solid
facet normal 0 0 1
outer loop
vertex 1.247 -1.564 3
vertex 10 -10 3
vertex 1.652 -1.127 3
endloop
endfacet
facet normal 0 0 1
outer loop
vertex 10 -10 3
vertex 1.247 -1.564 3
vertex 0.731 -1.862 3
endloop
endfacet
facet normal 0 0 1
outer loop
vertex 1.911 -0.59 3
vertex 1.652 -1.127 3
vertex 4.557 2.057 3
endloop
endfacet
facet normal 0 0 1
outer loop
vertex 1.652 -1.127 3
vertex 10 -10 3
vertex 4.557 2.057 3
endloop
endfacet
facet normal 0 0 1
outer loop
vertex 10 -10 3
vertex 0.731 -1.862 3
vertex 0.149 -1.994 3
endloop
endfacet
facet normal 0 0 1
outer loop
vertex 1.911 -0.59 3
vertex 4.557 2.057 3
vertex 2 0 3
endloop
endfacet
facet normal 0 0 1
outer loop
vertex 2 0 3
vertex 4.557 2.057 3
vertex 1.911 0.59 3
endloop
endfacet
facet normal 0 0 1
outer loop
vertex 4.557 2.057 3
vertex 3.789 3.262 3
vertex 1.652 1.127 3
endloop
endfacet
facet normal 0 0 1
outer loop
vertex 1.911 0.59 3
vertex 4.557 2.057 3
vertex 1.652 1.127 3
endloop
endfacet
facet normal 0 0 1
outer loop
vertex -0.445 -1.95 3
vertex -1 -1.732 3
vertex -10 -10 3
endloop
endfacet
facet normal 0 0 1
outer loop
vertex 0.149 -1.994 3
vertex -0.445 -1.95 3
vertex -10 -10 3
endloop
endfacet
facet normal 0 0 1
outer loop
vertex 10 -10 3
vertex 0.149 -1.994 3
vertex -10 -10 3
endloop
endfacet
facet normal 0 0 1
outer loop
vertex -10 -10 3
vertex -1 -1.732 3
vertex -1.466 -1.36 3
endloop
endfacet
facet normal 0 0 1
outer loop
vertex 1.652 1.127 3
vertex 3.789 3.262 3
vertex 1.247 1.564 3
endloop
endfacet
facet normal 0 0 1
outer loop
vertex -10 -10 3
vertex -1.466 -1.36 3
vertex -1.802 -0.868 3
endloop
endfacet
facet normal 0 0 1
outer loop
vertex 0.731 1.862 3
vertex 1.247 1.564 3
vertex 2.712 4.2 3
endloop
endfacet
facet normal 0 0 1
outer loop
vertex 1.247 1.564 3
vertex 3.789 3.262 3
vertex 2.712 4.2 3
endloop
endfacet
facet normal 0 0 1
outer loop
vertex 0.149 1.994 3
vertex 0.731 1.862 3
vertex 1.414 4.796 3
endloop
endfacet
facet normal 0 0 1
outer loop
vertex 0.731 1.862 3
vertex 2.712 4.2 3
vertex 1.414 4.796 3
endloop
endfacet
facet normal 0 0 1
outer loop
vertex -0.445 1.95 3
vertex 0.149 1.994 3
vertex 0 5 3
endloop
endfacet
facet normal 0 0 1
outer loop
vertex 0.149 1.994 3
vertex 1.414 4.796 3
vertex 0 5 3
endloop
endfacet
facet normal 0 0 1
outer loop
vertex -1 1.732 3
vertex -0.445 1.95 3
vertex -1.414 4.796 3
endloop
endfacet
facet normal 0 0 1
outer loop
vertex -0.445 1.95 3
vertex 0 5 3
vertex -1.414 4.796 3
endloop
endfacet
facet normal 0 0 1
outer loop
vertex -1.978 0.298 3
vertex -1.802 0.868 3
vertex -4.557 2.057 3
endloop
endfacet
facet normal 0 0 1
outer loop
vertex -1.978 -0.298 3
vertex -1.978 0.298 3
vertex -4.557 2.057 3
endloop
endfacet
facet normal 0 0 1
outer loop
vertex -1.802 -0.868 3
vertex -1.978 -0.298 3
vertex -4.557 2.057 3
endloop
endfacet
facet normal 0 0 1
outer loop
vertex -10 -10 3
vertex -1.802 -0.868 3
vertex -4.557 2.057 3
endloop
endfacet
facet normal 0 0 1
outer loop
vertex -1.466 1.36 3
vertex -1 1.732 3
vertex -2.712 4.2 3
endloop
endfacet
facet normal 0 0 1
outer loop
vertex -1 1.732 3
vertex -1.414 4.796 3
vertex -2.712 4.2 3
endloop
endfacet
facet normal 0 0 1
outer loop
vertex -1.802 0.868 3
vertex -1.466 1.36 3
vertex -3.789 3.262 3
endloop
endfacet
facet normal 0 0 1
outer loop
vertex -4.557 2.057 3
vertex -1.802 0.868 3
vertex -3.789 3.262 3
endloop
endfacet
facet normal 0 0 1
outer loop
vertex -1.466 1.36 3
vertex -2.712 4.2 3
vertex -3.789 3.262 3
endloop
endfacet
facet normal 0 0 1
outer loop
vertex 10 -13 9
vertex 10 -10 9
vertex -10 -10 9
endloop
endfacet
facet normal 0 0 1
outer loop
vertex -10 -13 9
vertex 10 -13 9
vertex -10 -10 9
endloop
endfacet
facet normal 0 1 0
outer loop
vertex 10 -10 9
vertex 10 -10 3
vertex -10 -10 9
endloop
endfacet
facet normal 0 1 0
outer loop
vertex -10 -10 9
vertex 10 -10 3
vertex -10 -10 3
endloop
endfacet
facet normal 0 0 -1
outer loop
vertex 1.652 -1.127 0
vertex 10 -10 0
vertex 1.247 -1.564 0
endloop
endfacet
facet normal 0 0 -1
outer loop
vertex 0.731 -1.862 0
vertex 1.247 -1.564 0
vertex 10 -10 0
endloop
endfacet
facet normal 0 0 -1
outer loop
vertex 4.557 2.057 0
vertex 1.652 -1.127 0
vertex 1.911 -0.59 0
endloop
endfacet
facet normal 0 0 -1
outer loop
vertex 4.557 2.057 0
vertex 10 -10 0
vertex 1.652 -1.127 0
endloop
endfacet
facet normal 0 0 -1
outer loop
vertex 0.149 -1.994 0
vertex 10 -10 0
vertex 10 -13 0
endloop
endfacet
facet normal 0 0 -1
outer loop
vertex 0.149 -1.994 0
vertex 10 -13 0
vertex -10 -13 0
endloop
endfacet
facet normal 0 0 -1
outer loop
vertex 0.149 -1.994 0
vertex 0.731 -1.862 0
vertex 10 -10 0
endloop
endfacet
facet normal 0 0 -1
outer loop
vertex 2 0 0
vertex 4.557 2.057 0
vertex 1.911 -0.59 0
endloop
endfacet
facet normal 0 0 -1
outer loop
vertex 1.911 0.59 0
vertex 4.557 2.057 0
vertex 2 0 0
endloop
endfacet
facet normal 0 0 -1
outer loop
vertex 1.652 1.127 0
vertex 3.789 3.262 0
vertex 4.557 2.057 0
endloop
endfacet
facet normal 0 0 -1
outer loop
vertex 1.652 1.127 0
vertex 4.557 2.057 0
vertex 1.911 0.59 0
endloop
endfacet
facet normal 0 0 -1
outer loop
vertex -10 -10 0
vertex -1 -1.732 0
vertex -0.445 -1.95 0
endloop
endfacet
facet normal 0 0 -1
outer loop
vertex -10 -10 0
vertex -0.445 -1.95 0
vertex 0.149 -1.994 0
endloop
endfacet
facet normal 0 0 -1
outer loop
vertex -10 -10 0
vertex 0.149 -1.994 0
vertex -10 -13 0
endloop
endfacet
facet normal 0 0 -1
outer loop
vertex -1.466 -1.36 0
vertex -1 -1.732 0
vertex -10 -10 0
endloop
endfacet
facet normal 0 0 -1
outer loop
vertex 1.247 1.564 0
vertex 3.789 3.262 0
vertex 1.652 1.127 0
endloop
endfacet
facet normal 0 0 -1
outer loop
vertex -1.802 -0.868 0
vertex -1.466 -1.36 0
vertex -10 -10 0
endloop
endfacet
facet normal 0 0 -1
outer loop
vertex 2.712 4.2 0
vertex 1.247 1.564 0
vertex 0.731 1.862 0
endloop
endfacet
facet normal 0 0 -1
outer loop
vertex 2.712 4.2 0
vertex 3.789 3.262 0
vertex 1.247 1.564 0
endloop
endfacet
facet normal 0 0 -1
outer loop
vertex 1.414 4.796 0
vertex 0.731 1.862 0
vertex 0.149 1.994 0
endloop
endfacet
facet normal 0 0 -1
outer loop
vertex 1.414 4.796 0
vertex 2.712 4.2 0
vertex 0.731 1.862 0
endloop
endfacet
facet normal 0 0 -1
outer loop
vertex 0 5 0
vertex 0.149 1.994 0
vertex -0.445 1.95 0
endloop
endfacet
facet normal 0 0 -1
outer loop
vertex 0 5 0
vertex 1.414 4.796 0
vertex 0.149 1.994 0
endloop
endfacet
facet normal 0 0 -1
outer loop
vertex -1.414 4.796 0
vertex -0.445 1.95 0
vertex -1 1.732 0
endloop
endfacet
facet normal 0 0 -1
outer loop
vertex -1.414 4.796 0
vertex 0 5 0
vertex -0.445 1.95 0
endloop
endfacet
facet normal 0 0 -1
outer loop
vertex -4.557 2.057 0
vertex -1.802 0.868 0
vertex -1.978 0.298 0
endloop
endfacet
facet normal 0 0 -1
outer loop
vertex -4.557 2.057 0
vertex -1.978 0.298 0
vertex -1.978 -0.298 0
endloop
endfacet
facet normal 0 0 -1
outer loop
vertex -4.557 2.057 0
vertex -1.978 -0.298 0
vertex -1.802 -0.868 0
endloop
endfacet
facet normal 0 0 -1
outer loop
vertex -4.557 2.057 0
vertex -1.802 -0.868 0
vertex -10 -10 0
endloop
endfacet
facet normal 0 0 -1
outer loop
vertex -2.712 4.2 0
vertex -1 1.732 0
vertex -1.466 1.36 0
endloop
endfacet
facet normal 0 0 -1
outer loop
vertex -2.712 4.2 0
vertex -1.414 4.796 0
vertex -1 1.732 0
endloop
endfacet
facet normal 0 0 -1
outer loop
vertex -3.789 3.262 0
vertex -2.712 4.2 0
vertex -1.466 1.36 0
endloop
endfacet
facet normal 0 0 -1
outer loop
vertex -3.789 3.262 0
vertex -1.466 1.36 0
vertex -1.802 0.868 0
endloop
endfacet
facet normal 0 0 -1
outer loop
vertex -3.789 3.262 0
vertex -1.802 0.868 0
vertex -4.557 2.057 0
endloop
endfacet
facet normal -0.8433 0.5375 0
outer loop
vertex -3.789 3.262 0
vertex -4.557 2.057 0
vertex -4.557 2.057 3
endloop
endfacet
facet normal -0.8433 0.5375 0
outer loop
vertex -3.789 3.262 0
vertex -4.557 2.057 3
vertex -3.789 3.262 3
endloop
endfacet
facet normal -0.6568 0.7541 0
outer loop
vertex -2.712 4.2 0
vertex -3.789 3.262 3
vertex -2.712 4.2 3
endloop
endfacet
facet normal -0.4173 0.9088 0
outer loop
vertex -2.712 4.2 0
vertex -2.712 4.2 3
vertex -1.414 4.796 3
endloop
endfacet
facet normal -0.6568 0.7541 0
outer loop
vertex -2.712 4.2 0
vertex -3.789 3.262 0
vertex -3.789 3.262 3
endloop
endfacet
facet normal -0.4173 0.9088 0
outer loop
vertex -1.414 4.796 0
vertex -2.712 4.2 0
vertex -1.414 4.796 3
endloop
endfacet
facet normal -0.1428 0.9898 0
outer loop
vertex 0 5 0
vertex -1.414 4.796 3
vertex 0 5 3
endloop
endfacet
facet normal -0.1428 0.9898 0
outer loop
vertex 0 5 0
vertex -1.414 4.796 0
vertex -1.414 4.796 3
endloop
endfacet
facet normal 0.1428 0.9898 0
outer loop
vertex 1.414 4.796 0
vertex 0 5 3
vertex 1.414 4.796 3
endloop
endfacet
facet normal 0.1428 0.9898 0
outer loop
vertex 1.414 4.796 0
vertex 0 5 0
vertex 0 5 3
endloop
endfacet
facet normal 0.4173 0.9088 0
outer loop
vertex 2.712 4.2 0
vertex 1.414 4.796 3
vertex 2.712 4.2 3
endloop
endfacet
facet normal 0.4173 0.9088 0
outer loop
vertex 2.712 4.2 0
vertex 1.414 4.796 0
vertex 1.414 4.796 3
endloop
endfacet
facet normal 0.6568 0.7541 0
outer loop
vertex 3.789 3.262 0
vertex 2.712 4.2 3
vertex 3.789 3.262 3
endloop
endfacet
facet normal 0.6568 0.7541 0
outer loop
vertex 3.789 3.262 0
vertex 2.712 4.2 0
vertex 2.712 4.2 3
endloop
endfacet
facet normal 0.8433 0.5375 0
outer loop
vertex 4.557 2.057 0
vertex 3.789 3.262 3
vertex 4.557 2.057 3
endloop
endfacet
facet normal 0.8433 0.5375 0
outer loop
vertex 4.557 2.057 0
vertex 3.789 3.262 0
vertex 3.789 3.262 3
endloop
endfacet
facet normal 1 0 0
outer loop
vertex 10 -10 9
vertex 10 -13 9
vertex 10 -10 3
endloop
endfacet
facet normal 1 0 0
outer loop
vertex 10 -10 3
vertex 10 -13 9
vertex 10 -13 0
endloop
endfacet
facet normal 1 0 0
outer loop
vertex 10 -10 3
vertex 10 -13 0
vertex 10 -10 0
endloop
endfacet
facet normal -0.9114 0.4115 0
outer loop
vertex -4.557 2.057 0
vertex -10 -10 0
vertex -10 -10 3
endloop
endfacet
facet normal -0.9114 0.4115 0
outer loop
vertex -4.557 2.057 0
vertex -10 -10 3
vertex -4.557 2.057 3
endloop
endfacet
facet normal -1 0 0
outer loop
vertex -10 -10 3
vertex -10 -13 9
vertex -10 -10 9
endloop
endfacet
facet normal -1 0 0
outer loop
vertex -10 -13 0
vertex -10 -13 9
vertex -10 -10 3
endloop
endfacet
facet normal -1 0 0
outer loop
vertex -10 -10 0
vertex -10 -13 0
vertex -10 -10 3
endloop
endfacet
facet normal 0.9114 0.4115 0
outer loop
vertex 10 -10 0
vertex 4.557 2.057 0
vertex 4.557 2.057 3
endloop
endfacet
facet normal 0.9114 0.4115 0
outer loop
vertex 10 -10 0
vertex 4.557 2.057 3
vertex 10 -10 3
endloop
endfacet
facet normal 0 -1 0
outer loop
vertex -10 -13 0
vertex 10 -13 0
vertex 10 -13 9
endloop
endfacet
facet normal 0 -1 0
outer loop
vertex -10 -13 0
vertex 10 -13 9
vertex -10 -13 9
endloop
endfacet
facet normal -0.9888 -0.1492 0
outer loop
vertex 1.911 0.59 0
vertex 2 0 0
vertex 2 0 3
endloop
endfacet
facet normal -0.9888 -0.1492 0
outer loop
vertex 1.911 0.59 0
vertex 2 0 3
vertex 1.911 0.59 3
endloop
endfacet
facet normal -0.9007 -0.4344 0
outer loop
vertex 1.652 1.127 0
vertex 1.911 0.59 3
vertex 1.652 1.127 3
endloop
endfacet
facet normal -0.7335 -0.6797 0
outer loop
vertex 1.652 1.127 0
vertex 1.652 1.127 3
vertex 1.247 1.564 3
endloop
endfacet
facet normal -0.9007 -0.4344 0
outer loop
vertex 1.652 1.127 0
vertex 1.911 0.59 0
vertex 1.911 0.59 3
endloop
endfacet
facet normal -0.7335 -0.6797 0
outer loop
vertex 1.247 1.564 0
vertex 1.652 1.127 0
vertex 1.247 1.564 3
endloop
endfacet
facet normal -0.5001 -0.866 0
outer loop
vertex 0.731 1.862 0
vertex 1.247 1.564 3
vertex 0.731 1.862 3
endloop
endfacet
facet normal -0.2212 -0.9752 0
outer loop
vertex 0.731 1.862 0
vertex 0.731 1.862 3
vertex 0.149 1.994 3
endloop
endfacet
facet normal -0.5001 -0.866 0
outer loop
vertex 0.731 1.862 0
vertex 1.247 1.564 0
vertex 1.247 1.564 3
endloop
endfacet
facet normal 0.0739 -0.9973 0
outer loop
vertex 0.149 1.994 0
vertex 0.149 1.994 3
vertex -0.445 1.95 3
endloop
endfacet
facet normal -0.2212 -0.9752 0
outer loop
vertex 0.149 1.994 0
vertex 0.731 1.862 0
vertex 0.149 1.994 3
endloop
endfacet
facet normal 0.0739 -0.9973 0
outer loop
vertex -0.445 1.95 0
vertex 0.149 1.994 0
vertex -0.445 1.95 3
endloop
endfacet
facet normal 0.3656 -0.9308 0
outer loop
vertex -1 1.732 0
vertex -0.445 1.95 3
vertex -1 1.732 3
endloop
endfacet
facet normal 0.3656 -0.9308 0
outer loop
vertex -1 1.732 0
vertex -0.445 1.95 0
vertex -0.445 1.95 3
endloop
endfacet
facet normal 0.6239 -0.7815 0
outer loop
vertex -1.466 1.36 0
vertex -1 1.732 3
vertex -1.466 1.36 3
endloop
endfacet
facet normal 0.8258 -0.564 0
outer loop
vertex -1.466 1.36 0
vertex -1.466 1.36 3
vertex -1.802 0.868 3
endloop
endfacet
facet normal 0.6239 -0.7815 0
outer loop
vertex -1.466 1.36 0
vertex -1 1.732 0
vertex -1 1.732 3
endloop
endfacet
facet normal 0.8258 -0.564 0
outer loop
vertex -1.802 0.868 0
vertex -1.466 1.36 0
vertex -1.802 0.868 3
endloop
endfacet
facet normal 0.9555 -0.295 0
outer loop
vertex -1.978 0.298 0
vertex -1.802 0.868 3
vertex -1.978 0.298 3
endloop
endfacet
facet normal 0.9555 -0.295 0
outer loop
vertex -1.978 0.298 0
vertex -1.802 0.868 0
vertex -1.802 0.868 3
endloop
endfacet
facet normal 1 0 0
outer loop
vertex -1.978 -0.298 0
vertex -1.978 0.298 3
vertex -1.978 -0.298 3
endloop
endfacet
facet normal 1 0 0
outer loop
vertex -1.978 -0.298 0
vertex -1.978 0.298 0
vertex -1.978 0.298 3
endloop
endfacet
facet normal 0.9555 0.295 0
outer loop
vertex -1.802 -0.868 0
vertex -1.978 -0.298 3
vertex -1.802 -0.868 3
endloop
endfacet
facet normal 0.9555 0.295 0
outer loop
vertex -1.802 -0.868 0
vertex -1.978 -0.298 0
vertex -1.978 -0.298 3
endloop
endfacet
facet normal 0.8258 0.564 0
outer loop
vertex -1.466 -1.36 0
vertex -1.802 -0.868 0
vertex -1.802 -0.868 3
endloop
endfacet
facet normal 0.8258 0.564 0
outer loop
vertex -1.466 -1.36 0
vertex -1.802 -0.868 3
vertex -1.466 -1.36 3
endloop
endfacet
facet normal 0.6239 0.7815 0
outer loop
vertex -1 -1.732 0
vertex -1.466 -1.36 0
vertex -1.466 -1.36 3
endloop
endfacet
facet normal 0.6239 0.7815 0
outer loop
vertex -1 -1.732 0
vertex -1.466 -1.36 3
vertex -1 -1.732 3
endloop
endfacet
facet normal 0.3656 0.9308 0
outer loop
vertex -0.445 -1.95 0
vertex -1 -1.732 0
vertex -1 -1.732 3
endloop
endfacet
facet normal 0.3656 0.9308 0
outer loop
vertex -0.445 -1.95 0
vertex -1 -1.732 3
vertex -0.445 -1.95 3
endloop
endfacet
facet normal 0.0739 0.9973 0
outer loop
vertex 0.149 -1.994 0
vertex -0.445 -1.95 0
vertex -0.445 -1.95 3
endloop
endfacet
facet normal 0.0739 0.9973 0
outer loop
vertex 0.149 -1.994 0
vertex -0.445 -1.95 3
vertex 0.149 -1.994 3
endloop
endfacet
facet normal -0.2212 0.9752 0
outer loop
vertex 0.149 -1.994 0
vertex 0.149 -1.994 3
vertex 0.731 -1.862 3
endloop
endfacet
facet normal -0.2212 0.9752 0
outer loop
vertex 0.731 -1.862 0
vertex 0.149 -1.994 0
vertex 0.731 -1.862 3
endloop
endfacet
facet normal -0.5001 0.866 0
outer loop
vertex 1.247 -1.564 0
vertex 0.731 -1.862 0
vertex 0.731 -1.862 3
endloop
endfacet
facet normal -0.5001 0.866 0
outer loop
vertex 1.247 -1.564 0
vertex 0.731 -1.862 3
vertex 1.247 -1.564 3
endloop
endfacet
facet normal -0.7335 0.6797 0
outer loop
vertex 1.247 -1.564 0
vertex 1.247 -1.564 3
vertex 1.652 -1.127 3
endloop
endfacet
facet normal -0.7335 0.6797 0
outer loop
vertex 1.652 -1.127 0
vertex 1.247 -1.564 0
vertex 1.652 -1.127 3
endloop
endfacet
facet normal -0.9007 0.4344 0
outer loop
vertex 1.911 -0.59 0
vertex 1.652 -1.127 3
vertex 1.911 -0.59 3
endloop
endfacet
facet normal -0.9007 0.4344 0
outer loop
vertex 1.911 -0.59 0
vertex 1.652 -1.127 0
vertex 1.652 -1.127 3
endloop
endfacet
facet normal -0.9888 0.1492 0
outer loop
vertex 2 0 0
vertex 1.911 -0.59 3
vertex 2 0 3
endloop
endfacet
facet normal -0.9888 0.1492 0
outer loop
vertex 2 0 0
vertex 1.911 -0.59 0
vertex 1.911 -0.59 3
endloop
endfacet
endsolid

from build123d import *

# Parameters (mm, degrees)
SKETCH_1_R      = 2
EXTRUDE_1_DEPTH = 3
SKETCH_2_W      = 20
SKETCH_2_H      = 3
EXTRUDE_2_DEPTH = 9


with BuildPart() as part:
    # 草图1 → 凸台-拉伸1 (new body)
    with BuildSketch(Plane.XY):
        with BuildLine():
            Line((0, -10), (-10, -10))
            Line((-10, -10), (-4.557189139, 2.057189139))
            ThreePointArc((-4.557189139, 2.057189139), (0, 5), (4.557189139, 2.057189139))
            Line((4.557189139, 2.057189139), (10, -10))
            Line((10, -10), (0, -10))
        make_face()
        Circle(SKETCH_1_R, mode=Mode.SUBTRACT)
    extrude(amount=EXTRUDE_1_DEPTH)

    # 草图2 → 凸台-拉伸2 (add)
    with BuildSketch(Plane(origin=(0, 0, 0), x_dir=(-1, 0, 0), z_dir=(0, 0, -1))):
        with Locations((0, -11.5)):
            Rectangle(SKETCH_2_W, SKETCH_2_H)
    extrude(amount=-EXTRUDE_2_DEPTH)


solid = part.part
